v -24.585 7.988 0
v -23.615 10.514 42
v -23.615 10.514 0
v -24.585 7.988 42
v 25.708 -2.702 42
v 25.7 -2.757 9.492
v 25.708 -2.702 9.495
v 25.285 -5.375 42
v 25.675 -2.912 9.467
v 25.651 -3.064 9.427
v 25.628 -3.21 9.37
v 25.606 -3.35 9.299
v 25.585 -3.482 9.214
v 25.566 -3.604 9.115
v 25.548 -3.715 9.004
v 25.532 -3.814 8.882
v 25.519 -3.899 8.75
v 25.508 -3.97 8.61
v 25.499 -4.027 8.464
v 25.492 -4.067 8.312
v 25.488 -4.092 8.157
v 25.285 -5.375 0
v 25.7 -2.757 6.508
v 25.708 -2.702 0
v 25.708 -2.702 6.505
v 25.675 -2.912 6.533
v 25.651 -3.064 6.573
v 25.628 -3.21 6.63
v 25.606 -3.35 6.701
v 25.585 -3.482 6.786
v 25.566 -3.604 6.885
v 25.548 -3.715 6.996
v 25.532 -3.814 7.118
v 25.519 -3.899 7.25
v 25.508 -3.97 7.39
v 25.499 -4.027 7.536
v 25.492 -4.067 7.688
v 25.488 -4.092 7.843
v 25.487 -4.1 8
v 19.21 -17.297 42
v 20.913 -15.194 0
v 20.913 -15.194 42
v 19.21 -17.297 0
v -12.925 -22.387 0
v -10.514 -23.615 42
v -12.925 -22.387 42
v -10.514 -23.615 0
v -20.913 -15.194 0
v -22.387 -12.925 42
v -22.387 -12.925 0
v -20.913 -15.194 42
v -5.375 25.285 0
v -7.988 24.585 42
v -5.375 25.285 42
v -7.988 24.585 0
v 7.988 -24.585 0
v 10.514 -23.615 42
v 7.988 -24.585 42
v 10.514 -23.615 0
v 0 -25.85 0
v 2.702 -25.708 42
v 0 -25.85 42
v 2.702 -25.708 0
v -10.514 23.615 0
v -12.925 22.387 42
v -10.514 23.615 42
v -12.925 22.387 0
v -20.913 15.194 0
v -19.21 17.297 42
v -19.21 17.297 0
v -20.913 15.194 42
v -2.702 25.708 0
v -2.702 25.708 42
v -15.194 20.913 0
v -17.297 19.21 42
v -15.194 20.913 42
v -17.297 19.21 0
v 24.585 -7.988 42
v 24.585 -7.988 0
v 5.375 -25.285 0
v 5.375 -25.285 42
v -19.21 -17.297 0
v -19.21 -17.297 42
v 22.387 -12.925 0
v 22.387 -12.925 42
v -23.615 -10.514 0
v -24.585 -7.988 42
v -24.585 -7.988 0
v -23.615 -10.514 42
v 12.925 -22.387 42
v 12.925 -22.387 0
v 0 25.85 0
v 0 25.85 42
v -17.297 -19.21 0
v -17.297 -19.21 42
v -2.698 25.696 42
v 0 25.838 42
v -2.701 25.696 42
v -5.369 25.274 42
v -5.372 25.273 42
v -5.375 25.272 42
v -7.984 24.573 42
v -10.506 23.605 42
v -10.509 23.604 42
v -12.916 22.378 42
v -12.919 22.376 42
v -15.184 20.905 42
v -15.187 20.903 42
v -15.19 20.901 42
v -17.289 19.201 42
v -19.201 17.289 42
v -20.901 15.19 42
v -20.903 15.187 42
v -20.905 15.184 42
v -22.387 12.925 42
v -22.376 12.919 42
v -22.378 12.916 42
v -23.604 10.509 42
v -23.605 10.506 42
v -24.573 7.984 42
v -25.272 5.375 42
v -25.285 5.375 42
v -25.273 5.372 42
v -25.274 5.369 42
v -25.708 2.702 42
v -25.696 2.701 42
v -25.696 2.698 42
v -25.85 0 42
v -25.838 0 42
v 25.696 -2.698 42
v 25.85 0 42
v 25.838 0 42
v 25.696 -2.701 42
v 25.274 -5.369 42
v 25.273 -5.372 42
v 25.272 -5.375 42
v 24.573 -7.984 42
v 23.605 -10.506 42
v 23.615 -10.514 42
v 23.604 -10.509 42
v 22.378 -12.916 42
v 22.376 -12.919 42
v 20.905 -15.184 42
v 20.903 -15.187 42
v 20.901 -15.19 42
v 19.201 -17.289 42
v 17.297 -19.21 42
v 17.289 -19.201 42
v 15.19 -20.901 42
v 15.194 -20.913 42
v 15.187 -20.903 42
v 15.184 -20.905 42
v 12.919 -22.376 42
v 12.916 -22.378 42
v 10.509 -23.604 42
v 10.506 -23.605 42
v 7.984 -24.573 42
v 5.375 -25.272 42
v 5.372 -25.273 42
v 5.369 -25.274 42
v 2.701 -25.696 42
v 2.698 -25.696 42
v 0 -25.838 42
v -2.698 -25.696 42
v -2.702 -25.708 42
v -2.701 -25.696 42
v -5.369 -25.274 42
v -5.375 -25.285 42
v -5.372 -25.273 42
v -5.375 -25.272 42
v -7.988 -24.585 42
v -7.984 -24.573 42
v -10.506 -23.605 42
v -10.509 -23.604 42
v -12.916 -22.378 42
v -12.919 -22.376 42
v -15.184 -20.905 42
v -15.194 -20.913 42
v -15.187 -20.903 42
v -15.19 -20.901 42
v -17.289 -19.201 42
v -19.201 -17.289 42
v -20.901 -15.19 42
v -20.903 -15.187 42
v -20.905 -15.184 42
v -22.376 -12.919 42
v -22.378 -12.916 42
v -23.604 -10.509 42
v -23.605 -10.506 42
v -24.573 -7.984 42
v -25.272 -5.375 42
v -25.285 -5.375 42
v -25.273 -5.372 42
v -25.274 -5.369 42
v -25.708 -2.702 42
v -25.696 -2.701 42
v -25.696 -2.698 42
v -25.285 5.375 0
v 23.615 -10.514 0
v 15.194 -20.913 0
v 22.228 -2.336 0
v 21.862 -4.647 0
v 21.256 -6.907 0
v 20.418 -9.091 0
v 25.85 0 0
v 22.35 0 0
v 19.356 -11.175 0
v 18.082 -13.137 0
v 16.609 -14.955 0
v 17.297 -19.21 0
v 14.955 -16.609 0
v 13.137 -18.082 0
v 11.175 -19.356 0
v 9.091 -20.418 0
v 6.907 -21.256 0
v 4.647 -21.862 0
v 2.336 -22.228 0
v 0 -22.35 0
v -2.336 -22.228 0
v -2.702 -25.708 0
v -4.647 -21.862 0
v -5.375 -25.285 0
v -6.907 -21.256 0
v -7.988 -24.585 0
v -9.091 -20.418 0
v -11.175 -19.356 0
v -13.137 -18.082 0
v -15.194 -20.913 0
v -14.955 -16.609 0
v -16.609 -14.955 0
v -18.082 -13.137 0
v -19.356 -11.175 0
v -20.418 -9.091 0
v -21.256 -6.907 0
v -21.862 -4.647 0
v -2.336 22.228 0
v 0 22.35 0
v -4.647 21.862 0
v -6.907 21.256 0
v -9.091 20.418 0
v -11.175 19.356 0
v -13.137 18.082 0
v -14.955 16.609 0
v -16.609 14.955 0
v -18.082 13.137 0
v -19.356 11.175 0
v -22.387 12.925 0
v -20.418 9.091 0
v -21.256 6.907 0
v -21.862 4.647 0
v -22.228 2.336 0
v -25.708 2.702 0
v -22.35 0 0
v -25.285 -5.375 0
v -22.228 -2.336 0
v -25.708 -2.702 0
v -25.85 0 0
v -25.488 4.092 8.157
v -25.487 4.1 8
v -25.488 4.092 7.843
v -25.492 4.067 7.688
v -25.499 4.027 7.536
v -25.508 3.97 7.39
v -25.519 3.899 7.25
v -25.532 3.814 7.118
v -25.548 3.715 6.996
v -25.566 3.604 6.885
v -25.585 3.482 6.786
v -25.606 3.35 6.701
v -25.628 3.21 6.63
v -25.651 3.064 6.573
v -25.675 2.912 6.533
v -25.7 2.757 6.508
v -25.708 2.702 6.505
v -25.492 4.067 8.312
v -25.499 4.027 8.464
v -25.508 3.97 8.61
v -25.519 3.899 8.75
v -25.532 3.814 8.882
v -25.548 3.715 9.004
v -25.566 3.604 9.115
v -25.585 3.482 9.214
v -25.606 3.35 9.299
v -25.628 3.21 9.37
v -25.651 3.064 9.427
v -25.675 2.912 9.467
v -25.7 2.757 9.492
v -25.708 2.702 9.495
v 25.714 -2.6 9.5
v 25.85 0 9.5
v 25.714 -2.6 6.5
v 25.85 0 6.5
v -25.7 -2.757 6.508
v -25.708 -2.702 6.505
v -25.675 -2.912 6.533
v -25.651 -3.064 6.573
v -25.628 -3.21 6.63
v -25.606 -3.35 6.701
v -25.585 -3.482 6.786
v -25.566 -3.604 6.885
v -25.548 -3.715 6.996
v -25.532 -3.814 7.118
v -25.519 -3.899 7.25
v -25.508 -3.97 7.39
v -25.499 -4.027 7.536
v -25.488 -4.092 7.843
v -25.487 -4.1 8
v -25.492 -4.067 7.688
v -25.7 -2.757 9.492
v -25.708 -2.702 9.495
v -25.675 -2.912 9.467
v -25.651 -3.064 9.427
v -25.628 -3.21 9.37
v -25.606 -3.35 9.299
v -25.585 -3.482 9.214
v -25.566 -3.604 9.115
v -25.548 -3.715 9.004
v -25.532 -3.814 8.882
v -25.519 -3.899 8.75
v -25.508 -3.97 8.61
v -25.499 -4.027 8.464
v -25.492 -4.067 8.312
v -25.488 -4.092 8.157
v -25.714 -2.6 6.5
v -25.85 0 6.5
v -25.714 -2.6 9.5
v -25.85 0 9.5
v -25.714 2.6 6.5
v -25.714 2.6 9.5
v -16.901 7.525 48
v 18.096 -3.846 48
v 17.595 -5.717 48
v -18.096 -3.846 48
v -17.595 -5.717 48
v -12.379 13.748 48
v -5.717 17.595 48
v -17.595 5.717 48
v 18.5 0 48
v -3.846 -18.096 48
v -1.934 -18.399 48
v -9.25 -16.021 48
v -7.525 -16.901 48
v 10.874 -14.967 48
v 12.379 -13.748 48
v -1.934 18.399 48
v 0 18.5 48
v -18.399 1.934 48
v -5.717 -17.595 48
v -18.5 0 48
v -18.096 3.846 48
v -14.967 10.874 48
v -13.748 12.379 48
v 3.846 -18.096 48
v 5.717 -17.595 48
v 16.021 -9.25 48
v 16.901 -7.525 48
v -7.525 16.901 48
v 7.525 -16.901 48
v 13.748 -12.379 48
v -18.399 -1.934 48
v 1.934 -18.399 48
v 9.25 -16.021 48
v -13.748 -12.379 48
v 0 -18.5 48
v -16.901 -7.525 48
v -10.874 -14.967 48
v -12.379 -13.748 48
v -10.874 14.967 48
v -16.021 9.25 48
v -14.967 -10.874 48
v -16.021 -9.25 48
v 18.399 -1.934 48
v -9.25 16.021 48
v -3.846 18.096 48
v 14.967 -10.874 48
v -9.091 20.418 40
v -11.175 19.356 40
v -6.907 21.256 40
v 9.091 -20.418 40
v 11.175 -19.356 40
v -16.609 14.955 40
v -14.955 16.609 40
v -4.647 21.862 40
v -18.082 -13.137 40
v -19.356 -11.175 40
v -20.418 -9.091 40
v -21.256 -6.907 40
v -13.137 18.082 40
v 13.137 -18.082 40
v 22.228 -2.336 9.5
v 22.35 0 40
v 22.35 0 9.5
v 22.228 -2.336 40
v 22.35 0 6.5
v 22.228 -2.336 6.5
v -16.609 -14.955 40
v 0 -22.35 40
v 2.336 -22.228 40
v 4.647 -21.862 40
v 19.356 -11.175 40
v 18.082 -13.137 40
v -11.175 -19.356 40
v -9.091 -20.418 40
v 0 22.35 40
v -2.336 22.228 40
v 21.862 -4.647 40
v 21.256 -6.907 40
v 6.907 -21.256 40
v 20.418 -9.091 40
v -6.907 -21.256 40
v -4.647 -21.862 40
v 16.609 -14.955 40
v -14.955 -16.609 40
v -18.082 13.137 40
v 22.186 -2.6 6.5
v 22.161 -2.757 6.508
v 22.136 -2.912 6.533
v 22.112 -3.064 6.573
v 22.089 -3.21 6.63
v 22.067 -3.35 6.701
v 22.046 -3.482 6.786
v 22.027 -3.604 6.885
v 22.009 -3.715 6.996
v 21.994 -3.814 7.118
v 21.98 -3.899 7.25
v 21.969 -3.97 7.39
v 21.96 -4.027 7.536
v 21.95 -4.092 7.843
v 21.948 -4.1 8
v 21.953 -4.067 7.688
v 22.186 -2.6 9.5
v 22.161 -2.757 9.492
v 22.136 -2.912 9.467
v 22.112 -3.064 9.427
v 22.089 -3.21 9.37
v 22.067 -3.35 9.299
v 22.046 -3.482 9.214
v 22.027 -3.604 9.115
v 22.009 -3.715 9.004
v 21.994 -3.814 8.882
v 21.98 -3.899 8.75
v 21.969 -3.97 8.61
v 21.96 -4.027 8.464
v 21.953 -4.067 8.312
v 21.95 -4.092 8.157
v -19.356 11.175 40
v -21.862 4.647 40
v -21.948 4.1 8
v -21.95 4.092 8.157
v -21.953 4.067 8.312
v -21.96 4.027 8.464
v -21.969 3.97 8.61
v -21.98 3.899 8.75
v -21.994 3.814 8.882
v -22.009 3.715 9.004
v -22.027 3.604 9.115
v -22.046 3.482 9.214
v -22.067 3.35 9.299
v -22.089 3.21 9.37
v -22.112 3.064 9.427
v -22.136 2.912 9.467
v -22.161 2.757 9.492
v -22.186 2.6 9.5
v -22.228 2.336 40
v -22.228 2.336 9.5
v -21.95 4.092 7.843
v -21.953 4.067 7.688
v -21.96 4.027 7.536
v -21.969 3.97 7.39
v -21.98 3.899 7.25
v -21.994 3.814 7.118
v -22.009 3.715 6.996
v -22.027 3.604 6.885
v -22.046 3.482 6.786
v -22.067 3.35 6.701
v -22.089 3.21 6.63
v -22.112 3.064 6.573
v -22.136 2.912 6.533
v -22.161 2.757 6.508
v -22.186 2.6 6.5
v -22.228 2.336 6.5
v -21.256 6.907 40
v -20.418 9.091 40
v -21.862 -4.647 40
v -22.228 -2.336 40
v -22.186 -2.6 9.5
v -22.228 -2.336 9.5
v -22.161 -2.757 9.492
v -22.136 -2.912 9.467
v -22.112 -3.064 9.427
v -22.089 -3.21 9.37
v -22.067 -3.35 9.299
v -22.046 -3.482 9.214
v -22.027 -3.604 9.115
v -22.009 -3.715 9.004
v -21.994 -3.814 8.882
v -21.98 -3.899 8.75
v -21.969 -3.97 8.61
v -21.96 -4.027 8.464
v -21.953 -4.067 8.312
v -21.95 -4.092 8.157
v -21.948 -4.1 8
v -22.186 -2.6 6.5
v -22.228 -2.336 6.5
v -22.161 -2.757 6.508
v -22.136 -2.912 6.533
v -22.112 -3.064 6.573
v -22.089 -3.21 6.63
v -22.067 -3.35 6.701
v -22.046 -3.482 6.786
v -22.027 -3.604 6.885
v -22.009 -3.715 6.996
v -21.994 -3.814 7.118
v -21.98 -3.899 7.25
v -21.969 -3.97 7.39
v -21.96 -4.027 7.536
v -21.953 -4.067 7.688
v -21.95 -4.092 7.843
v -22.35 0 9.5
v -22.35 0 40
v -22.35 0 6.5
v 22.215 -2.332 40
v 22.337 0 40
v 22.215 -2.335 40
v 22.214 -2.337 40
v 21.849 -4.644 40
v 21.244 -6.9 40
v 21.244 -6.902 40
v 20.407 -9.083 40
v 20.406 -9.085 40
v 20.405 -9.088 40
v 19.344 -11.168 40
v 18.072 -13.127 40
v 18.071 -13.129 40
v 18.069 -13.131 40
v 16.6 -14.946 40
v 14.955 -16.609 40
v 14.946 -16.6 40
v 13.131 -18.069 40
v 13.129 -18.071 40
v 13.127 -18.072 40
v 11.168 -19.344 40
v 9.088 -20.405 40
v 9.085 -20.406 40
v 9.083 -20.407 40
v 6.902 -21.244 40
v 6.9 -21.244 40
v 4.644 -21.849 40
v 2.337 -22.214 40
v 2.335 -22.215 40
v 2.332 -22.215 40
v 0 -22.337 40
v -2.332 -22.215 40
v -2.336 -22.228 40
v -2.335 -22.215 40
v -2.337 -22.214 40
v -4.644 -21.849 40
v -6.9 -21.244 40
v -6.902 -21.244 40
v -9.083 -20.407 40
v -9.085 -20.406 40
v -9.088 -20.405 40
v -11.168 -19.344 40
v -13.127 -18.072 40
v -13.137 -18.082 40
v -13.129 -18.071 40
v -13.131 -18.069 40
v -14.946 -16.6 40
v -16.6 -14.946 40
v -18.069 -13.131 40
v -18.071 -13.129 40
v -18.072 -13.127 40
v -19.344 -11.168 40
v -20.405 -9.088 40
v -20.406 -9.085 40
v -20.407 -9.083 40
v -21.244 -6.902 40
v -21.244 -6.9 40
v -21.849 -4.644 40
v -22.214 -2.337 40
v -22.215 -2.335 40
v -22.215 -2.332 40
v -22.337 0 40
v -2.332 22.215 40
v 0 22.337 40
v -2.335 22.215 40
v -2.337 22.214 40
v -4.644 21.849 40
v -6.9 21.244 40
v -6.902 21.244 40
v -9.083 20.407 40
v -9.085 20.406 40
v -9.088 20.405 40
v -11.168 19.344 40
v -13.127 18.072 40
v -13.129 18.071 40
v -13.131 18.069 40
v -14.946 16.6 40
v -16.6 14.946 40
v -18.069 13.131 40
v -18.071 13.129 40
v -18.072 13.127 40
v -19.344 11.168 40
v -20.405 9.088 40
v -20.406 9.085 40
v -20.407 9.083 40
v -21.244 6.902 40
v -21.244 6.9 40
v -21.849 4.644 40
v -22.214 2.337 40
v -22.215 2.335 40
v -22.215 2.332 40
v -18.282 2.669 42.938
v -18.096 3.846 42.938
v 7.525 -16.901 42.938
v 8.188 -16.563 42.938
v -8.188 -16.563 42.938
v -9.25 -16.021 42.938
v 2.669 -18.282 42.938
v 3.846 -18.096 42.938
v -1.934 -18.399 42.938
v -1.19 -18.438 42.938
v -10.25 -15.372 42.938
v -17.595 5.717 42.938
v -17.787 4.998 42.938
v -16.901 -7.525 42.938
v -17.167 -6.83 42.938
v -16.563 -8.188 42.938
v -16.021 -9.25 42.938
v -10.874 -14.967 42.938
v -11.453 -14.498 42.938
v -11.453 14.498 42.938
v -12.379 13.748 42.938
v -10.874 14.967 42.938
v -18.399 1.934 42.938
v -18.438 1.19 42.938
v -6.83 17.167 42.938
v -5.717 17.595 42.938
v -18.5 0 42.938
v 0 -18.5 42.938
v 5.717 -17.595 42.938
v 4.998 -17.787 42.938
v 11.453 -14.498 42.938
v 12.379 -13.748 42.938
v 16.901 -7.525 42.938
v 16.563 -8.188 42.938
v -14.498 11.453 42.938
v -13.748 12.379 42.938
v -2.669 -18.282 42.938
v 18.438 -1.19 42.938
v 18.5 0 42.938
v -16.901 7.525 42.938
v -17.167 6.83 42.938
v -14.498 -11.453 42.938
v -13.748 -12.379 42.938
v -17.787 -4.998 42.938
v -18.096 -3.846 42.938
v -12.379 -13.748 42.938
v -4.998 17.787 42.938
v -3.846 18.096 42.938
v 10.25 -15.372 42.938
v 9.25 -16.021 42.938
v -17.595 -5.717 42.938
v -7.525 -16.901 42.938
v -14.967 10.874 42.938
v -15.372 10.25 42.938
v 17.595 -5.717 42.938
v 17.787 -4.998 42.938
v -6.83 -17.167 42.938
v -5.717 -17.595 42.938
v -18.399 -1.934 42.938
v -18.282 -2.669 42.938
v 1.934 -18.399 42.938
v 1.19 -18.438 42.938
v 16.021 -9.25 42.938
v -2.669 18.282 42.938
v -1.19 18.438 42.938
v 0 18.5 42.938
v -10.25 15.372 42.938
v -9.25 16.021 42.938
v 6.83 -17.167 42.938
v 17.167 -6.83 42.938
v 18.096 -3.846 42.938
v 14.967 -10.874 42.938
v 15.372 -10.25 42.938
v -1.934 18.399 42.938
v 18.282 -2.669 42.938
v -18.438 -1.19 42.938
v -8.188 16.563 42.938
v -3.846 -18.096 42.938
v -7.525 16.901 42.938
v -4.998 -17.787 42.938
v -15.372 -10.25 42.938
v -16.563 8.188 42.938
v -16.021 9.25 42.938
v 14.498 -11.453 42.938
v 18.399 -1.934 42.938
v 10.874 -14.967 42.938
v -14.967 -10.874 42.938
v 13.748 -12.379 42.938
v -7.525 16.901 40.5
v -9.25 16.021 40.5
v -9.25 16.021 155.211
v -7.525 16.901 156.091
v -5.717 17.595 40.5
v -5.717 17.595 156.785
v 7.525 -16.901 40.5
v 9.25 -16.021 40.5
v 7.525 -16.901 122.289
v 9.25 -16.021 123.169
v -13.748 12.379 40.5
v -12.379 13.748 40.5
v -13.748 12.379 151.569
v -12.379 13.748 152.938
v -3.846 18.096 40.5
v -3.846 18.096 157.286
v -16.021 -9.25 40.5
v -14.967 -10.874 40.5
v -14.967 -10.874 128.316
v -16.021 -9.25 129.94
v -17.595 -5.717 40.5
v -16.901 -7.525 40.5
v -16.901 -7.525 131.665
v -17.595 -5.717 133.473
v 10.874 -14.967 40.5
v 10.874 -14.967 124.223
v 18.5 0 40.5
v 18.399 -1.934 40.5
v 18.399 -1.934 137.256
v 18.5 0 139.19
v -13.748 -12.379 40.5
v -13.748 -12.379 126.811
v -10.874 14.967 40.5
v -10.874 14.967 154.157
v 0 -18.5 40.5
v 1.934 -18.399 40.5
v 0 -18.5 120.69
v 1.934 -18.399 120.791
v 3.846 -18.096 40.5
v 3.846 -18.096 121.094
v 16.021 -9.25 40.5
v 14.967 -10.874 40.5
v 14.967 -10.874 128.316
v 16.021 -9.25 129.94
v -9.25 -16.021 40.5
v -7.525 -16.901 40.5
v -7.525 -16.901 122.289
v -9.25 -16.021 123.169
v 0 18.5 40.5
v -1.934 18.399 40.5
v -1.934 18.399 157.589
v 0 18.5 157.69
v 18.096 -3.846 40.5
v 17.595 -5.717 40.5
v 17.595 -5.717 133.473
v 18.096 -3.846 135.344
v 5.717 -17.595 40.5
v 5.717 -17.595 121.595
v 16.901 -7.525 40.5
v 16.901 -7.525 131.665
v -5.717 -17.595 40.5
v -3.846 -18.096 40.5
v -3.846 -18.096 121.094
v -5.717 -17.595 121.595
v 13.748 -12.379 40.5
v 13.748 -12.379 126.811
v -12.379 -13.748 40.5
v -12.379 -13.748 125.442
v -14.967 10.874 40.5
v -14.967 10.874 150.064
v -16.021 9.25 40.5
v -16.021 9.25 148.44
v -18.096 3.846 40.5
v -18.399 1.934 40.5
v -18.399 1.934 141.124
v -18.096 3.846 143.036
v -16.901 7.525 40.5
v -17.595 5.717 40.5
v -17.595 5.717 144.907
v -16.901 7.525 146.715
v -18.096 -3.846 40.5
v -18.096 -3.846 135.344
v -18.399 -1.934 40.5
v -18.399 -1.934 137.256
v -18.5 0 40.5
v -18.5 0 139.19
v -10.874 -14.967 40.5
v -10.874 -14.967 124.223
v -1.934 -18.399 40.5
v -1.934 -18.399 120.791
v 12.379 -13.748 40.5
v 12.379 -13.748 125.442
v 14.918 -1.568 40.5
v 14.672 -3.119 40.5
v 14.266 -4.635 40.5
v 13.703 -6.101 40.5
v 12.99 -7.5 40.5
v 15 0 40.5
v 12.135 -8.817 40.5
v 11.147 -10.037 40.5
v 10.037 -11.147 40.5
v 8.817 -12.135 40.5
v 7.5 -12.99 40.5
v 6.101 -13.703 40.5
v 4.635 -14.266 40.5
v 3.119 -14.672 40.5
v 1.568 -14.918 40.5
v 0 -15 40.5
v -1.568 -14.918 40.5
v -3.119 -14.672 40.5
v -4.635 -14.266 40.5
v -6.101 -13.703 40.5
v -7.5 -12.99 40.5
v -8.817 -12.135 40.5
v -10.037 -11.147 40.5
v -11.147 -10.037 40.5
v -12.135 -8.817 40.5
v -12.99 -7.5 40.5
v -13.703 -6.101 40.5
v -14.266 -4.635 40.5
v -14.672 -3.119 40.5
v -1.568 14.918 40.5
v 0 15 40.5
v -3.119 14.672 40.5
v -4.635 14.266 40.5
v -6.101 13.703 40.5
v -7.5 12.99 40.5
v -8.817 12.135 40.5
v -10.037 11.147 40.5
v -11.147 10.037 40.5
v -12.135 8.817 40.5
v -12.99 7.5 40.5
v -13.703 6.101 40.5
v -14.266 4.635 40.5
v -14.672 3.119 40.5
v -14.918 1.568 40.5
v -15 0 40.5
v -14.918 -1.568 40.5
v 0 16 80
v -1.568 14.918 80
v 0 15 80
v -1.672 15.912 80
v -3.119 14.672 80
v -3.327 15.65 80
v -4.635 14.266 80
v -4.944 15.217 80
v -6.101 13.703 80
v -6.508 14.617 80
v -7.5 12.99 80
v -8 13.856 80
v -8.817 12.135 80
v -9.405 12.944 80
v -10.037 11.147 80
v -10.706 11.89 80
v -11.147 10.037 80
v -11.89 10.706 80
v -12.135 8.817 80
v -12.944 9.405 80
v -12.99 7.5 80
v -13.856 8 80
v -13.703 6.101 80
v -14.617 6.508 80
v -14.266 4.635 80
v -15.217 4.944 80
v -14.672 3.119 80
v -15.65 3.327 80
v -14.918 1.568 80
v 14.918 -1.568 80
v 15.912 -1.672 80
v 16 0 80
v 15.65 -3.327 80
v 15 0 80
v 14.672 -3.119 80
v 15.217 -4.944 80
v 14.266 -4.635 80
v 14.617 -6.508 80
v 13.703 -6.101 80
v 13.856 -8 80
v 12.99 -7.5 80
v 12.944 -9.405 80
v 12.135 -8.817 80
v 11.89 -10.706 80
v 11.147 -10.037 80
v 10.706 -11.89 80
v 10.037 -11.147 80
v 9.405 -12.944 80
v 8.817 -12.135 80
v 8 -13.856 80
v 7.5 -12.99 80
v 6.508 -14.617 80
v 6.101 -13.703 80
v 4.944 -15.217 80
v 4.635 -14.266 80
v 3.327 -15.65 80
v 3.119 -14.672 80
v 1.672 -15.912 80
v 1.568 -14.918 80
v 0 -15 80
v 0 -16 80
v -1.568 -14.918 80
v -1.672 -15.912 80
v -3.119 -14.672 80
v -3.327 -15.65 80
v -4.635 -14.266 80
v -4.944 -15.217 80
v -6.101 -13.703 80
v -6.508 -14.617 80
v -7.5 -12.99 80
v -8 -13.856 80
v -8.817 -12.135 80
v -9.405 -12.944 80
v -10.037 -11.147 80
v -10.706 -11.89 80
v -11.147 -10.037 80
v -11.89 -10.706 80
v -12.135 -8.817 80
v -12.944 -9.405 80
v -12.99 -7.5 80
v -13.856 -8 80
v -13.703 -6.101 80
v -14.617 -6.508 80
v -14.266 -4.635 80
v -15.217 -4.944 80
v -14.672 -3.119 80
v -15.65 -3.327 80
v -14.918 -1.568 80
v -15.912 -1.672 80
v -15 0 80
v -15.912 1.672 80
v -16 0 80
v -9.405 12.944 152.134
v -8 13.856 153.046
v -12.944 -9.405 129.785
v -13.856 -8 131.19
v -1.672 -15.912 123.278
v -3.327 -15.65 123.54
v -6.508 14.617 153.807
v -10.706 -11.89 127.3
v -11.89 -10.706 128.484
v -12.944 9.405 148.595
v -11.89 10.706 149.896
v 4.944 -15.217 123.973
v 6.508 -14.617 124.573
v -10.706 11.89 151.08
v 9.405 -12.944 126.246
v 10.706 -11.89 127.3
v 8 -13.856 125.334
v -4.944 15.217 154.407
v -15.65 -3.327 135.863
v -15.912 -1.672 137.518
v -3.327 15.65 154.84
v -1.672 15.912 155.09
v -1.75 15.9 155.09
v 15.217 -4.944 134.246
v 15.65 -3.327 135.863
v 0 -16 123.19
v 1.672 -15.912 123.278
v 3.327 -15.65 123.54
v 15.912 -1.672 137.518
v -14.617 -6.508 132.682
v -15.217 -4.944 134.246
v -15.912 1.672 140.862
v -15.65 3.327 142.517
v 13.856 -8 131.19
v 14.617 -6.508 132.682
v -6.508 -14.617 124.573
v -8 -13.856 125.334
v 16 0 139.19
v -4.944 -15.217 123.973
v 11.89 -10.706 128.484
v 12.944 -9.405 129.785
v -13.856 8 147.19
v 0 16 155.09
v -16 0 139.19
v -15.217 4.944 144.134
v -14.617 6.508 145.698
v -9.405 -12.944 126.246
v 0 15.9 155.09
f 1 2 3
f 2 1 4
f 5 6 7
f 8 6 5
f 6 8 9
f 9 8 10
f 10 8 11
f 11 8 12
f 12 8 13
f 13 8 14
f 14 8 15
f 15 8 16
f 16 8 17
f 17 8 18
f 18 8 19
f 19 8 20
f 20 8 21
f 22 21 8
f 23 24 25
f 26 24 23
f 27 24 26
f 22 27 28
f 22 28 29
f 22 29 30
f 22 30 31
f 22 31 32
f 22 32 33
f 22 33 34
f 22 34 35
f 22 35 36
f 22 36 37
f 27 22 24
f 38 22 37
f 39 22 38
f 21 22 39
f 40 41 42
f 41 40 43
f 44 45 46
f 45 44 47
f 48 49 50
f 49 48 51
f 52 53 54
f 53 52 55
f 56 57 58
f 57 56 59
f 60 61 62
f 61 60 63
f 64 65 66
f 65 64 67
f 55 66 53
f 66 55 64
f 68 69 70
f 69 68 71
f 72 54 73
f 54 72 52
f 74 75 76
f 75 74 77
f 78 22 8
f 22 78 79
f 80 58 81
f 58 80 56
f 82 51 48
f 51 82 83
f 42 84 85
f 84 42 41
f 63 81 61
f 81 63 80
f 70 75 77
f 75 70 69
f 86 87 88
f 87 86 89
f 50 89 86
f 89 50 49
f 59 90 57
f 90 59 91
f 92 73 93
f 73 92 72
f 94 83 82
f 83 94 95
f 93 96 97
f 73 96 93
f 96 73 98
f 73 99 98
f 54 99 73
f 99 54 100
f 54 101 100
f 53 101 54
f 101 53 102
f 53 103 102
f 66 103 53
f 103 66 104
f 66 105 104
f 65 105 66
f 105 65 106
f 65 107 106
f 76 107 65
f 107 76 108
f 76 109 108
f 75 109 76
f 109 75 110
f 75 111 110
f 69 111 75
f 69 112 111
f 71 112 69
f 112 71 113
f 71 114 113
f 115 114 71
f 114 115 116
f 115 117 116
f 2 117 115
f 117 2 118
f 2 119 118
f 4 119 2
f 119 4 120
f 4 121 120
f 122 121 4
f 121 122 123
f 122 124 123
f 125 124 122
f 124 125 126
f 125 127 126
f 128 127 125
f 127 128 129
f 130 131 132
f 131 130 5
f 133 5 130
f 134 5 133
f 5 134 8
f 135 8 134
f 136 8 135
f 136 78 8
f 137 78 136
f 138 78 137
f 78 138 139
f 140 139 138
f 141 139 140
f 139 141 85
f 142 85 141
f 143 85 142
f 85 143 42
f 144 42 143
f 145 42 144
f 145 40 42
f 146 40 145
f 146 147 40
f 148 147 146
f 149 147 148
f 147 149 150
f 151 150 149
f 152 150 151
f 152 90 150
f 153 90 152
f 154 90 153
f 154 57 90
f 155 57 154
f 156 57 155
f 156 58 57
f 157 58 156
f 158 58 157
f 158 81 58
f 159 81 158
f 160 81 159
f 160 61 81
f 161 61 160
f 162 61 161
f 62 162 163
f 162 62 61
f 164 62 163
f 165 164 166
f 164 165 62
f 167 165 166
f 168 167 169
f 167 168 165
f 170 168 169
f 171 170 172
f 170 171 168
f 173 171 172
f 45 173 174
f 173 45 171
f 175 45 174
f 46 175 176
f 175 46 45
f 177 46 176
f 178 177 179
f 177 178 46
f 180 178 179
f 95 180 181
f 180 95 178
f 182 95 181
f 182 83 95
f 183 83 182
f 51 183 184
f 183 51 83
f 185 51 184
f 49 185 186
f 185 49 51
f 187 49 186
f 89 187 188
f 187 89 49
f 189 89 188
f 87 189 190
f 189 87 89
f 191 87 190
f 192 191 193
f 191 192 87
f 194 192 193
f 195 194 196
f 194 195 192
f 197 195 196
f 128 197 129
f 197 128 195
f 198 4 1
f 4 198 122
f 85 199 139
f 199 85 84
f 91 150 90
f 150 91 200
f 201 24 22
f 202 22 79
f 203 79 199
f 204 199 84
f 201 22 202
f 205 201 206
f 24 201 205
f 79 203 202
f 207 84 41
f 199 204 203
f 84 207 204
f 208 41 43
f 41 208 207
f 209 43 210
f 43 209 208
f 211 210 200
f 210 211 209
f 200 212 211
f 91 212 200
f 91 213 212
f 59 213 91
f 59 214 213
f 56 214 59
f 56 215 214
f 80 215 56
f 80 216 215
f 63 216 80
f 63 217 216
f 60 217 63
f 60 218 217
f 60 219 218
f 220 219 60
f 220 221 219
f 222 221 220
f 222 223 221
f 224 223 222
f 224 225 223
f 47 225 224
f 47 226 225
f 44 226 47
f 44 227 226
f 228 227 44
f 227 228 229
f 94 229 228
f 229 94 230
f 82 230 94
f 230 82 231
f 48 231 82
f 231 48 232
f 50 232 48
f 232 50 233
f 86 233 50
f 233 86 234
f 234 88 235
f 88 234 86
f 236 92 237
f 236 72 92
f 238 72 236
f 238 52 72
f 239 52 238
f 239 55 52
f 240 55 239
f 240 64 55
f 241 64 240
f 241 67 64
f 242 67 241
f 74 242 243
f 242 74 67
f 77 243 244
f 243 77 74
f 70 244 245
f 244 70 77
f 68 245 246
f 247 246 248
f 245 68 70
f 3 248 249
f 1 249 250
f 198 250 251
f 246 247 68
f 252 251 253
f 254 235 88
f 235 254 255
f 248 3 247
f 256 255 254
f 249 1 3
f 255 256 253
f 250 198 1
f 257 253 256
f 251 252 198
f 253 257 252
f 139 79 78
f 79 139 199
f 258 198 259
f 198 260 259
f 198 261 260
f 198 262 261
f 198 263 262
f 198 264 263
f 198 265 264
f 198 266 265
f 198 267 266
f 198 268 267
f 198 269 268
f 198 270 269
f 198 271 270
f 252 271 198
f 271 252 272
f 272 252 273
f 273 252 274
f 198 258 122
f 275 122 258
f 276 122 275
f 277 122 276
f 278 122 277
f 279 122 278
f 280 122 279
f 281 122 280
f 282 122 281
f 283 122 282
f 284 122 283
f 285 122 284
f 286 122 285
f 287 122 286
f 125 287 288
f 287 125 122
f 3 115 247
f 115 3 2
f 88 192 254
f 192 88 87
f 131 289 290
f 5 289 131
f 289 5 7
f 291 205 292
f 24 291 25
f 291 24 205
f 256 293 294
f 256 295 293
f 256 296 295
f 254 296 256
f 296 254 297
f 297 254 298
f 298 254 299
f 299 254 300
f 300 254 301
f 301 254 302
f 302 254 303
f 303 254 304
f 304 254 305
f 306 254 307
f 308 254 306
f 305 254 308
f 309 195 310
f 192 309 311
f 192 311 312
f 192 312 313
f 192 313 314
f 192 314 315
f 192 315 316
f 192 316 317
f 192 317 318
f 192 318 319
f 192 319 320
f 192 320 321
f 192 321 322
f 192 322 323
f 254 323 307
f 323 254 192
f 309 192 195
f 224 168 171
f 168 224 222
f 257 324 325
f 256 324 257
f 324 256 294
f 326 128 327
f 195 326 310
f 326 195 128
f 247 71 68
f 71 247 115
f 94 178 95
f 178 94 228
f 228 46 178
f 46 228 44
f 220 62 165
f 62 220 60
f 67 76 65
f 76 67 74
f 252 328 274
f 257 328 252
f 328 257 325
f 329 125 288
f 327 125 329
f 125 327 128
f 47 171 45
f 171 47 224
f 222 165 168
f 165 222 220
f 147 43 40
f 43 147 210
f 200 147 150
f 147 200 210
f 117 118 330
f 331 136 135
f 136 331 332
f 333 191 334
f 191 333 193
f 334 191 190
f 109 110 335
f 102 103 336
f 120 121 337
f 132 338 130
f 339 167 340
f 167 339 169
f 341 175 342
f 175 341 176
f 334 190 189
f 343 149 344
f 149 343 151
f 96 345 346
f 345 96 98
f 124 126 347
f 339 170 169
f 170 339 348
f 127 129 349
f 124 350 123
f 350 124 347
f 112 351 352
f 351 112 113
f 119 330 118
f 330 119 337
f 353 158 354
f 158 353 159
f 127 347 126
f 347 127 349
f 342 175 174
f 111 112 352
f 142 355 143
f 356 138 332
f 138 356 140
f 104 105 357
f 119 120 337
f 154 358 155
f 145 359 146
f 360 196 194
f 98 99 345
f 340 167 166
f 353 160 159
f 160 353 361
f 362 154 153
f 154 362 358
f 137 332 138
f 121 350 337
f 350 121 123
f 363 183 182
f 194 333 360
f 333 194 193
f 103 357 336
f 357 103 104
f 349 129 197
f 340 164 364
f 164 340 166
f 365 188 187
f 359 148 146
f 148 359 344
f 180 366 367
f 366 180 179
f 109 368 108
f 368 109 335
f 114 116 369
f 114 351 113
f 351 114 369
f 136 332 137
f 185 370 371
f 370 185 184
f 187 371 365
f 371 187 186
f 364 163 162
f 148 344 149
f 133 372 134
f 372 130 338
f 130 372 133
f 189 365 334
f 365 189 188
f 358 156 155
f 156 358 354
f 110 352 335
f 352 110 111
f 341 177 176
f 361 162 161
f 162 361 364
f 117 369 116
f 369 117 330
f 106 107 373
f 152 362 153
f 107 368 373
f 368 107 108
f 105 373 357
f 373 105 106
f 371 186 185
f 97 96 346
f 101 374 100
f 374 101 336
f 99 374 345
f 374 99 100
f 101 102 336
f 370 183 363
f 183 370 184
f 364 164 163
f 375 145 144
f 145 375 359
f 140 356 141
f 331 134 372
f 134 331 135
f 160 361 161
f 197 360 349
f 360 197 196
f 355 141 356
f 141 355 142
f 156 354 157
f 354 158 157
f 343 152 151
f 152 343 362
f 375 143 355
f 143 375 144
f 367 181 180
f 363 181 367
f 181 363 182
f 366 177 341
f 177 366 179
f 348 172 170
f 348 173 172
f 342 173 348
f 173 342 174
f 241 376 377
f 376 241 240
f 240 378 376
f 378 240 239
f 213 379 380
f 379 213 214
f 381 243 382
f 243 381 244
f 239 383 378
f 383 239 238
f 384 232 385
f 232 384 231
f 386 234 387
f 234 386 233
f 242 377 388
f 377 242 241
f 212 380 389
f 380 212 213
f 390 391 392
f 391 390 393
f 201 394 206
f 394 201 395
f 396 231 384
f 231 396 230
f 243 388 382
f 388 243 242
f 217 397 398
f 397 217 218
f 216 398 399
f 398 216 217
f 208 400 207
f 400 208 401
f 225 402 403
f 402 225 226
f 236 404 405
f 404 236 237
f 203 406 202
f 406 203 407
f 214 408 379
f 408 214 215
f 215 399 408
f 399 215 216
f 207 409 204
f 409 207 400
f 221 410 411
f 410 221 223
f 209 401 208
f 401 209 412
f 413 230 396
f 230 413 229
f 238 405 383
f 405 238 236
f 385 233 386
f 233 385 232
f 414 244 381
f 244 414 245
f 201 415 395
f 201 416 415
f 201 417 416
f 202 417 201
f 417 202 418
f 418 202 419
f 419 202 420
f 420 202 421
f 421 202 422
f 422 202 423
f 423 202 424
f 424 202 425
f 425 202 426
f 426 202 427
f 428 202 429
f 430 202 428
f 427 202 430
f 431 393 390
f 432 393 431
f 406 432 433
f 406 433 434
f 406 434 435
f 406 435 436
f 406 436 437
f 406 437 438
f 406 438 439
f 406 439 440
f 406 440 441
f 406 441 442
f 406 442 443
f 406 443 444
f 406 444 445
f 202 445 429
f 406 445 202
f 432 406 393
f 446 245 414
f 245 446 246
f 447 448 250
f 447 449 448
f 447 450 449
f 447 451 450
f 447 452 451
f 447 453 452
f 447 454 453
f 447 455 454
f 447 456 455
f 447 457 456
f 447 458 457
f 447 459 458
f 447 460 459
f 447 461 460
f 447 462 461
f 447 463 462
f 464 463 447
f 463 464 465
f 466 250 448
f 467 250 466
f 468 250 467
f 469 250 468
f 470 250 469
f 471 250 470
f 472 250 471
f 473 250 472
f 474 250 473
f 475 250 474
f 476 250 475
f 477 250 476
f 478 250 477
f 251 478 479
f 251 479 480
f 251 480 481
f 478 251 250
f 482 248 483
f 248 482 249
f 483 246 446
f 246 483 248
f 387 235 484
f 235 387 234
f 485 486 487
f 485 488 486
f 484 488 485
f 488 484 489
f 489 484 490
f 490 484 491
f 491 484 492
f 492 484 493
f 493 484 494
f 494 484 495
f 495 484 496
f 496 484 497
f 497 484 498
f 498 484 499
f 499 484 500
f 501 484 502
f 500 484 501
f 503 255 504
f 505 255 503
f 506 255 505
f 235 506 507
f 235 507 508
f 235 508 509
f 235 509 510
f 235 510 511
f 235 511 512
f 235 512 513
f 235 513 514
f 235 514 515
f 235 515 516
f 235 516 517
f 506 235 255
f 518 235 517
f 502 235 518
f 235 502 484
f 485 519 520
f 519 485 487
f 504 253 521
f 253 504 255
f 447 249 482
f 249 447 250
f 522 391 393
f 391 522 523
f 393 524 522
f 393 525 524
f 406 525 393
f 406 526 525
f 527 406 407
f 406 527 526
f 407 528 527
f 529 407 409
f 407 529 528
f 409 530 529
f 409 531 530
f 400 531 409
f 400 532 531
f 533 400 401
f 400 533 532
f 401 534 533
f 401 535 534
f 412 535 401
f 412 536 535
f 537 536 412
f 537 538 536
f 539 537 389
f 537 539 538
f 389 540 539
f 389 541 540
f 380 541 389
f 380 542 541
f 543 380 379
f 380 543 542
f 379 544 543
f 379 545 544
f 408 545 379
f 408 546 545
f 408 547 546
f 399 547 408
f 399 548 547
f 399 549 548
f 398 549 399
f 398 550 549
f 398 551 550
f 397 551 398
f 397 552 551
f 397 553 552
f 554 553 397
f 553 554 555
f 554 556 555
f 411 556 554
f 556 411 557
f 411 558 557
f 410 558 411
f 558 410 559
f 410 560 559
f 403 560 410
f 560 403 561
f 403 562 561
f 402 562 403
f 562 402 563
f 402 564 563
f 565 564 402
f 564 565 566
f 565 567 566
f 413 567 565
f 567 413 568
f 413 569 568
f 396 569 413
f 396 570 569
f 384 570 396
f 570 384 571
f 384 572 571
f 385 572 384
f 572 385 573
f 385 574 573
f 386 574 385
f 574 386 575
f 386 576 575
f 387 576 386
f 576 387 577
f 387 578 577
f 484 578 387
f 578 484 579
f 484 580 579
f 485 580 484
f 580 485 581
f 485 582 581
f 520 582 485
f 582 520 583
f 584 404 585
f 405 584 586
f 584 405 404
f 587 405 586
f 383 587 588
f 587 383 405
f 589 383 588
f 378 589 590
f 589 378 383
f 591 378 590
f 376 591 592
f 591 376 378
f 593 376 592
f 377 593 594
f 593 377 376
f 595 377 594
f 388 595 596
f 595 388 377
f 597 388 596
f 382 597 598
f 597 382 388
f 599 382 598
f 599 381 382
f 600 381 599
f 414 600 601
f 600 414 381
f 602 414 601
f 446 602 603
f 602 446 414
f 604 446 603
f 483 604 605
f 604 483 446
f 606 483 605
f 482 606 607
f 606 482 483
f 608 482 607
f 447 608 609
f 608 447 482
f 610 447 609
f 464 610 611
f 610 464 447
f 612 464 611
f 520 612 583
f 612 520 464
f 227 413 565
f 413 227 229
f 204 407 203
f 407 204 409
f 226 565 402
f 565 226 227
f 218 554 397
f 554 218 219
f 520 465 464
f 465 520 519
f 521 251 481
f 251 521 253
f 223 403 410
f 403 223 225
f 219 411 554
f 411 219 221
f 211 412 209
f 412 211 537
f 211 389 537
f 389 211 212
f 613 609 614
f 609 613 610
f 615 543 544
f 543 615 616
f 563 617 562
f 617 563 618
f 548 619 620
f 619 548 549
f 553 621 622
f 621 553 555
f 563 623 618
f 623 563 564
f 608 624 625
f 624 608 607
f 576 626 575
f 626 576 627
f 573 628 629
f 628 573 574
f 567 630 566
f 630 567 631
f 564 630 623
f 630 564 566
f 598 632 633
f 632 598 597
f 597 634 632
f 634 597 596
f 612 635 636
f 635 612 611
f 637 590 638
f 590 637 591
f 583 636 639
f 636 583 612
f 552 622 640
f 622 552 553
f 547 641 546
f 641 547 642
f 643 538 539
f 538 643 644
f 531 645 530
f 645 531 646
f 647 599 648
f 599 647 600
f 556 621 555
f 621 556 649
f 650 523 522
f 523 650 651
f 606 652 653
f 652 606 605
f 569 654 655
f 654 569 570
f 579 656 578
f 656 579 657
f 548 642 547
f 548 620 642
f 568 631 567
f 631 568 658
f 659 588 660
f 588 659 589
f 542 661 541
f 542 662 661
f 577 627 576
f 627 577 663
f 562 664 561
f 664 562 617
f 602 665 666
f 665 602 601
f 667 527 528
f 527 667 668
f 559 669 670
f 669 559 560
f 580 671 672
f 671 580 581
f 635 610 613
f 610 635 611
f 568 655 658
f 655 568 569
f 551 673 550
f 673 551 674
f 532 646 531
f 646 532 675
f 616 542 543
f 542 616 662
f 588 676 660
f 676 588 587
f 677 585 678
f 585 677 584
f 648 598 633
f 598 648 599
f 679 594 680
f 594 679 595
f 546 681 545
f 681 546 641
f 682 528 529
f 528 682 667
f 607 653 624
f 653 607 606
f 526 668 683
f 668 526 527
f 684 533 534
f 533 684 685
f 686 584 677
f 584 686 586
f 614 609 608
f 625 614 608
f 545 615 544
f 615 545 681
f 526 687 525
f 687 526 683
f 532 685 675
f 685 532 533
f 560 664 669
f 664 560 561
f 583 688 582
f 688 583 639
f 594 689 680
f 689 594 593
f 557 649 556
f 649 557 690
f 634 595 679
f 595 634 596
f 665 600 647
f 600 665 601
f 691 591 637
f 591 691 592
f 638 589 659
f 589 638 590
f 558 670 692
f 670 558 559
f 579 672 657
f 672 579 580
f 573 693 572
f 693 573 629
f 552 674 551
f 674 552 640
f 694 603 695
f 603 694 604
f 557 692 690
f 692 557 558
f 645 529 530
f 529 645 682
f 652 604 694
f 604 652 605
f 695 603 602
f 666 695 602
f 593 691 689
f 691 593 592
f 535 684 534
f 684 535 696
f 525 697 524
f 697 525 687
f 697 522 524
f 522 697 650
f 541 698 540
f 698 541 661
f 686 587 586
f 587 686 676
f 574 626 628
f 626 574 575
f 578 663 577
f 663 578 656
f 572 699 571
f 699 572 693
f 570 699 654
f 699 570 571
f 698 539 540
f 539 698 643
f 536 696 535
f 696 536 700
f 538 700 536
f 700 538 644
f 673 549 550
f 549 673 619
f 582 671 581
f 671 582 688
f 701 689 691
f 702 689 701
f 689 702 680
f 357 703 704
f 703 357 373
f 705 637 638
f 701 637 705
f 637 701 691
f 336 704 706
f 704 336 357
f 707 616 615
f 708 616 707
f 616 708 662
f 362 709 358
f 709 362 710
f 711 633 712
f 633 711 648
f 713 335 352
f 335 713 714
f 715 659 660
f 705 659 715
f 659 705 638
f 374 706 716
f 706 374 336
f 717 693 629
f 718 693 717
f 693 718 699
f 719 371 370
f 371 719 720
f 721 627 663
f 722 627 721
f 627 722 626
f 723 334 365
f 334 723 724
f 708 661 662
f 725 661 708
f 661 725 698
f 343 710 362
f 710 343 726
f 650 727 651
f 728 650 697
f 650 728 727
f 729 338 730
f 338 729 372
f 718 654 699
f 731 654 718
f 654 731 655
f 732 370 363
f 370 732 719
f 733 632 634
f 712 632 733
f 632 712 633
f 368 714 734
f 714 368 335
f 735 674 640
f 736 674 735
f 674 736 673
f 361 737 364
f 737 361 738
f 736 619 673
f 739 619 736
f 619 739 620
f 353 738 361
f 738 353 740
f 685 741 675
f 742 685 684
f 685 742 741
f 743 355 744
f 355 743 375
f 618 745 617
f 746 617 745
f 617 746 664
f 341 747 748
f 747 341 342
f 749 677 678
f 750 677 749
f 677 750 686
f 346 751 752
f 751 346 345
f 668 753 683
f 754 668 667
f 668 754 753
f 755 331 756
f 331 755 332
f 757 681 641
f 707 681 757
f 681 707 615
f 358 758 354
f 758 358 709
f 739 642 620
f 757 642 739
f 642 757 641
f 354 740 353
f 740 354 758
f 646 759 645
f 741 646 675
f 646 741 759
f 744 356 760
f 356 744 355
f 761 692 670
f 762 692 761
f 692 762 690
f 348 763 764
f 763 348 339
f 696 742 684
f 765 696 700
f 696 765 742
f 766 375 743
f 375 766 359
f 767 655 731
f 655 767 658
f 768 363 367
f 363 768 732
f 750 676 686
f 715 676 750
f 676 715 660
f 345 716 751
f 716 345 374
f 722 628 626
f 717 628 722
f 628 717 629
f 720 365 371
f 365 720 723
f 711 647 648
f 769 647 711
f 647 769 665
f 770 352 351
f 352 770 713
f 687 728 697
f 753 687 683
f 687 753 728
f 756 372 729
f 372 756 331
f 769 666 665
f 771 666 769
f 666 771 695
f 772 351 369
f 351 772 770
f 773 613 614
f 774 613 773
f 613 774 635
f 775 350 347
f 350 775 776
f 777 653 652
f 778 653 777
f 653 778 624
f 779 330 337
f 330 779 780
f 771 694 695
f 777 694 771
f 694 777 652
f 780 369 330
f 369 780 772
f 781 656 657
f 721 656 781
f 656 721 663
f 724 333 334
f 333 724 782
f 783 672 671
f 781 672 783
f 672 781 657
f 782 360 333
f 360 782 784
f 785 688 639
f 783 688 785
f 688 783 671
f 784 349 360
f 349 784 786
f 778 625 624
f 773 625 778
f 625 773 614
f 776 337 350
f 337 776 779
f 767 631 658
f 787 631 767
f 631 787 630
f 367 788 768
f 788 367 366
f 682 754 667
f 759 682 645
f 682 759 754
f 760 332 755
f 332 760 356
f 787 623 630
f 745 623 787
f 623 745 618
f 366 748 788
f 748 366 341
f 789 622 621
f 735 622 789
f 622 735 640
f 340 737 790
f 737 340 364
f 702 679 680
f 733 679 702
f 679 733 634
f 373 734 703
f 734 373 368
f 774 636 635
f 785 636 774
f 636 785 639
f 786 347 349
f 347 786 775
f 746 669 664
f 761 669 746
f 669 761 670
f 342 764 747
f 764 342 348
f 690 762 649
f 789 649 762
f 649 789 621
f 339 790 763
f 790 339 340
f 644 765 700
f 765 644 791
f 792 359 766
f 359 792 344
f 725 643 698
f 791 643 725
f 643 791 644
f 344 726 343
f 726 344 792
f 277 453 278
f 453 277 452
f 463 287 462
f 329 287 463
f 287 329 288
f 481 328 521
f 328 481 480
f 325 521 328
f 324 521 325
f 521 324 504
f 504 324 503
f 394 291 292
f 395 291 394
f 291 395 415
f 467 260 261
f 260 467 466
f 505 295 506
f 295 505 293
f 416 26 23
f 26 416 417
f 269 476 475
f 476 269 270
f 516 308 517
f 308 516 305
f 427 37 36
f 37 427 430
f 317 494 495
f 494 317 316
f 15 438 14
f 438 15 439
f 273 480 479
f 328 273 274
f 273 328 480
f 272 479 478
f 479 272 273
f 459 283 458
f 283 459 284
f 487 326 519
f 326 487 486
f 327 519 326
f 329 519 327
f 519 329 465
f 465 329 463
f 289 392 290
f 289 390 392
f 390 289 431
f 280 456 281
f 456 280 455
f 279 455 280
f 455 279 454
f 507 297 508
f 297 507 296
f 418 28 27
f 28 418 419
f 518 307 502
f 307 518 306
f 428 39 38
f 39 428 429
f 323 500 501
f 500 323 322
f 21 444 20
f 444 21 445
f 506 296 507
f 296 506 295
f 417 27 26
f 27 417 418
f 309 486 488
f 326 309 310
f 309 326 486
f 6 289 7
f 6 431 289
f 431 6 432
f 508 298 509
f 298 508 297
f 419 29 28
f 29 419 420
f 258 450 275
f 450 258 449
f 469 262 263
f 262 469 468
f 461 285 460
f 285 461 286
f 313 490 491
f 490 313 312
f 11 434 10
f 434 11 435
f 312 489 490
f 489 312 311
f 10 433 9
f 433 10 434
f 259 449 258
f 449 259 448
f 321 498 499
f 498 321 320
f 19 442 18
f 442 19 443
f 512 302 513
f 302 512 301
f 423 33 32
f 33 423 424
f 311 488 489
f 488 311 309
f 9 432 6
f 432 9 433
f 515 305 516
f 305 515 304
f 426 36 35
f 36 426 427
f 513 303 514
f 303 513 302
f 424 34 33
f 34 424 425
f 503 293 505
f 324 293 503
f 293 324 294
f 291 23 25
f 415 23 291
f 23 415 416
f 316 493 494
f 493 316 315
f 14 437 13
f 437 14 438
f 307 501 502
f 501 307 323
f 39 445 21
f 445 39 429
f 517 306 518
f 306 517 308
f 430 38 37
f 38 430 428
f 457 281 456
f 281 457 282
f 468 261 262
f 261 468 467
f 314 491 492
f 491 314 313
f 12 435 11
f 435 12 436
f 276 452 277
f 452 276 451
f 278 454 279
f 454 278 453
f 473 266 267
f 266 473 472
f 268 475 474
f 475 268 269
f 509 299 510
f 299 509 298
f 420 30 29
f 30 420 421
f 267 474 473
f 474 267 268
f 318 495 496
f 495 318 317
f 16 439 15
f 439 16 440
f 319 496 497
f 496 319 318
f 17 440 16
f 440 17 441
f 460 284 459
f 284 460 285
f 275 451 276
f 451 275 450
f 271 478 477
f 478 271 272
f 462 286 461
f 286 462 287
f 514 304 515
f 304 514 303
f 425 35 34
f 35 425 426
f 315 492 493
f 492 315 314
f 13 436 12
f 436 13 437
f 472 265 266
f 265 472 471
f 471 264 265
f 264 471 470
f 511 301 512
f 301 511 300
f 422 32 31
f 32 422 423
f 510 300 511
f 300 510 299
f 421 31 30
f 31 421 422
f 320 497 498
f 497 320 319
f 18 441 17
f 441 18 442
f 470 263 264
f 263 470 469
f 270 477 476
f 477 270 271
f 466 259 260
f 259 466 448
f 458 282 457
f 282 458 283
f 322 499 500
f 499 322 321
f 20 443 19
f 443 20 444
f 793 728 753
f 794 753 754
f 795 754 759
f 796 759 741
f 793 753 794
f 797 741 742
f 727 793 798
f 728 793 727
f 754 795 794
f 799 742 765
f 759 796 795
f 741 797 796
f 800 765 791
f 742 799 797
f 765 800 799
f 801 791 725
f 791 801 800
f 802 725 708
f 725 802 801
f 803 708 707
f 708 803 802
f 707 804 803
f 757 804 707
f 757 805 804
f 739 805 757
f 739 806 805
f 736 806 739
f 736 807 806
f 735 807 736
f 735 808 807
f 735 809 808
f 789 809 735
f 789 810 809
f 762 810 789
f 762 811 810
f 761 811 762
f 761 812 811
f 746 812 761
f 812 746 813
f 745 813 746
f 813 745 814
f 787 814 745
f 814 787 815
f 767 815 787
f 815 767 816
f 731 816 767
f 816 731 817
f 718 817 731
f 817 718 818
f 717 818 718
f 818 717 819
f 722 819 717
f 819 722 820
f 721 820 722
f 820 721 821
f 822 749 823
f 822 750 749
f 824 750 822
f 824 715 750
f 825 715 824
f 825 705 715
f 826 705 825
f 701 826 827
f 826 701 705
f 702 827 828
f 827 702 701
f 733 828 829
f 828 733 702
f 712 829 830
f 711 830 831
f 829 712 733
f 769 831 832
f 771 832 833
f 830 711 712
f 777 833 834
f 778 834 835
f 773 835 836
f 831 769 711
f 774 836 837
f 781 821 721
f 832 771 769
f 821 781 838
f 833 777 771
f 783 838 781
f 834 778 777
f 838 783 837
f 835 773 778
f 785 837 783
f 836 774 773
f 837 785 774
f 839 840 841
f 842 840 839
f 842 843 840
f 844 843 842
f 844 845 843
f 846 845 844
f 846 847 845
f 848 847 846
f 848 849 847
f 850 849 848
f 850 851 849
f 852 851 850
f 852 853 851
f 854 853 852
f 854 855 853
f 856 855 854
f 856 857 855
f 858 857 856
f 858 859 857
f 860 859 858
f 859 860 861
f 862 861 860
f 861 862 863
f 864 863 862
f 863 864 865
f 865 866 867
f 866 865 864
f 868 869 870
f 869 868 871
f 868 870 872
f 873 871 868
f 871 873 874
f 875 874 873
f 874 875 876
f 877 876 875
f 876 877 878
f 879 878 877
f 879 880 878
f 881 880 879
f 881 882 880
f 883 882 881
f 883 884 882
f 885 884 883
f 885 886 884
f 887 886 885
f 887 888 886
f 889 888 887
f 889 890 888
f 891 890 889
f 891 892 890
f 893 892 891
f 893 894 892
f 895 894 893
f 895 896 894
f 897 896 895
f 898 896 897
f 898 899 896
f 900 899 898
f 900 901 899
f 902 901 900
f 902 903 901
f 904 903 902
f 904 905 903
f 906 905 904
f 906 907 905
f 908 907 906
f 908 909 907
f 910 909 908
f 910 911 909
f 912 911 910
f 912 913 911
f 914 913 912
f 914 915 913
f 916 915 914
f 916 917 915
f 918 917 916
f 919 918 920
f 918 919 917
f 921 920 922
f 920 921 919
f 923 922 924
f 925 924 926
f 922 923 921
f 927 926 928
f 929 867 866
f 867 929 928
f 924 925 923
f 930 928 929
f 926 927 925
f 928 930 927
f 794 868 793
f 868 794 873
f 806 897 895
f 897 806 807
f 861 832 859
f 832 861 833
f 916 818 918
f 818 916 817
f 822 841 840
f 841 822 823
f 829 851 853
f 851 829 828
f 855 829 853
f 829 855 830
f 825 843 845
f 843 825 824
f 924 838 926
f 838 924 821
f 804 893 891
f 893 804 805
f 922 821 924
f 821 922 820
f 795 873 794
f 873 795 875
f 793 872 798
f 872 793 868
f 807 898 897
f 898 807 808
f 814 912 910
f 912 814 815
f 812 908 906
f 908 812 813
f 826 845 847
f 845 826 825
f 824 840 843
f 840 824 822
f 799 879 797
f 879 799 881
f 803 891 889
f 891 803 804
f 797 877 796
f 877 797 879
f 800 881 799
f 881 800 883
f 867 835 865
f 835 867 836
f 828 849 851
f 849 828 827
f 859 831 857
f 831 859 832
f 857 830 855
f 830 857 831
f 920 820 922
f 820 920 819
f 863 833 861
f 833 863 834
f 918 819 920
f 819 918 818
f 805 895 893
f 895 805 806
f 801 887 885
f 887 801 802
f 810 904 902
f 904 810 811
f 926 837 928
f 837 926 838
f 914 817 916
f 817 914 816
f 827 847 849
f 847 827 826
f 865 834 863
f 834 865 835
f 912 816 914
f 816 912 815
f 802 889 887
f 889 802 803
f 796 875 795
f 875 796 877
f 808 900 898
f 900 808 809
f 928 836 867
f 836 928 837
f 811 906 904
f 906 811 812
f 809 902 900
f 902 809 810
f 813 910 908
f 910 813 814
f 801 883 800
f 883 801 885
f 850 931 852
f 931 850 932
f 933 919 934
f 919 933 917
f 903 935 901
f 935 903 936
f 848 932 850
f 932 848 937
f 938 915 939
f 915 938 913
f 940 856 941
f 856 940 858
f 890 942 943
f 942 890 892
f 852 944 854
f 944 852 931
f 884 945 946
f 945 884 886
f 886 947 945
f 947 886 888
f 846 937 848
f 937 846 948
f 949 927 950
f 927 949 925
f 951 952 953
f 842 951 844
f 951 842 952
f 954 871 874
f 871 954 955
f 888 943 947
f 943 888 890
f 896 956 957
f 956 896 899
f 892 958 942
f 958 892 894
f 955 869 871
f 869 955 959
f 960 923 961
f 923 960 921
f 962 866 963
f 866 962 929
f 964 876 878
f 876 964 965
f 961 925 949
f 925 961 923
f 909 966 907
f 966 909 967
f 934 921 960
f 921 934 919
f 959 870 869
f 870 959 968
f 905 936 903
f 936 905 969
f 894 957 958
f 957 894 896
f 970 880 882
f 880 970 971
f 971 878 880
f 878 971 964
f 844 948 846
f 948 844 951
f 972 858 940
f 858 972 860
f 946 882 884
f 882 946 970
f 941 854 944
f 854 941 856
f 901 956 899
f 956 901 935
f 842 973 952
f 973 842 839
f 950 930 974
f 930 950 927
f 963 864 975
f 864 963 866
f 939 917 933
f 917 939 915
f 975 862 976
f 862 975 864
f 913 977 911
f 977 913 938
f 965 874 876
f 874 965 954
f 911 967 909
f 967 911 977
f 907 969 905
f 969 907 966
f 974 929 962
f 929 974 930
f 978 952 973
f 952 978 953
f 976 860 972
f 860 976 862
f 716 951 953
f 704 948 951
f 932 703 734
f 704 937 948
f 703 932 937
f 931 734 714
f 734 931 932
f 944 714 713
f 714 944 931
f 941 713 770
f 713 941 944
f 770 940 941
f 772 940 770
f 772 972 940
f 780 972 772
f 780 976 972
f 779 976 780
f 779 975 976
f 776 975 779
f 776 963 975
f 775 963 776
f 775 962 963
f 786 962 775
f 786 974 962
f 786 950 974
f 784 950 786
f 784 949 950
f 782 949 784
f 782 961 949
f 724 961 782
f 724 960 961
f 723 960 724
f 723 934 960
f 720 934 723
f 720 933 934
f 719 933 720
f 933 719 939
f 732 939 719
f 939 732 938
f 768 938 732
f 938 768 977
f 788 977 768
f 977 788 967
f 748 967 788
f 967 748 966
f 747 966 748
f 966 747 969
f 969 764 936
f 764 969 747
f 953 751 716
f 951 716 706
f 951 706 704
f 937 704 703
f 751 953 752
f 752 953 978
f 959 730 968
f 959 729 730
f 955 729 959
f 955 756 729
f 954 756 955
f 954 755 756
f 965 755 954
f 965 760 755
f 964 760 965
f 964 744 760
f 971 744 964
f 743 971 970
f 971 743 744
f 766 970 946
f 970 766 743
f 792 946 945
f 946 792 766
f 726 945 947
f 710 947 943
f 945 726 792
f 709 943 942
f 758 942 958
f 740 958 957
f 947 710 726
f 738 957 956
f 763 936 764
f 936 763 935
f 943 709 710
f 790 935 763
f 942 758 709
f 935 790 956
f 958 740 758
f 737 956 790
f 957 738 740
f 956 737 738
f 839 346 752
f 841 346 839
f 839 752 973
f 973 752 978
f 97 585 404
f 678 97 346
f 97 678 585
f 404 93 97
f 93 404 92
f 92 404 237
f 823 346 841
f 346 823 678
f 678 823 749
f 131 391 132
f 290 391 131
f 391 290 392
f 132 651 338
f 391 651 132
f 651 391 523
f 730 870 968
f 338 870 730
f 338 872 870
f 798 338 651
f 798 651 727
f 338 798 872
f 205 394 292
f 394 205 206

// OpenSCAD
// Numatic HVR200
//
// handvat (zoals vastgemaakt aan de slang) 
//   - buitendiameter van 37mm 
//   - materiaal dikte varieert
//     - mondstuk zelf is ongeveer 2.5mm
//     - bredere stuk bij slang is bijna 4mm
//   - bredere stuk is 51.7mm
//     - overgang is 6mm
//     - lengte is 47 (incl overgang)
//     - uitsparingen voor nokjes
//       - d=3mm
//       - l=8.2
//       - afstand 6.5
// flexibele buis heeft opzetstuk van 43.5mm (dat draait in het handvat)
// metalen buis
//   - buitendiameter 31.6
// borstelmondstuk 
//   - binnnendiameter 31.3mm
// verbindingsstuk verloopt van 30 tot 32.9

// First plan was to print a 
// - Sleeve to reinforce existing mouthpiece
// - Now the design is a complete rebuild of the entire mouth piece


$fn=60;

module tube(
    diameter=37,
    l=73,
    m=2.5
) {
    diameter2=diameter-m*2;
    difference() {
      cylinder(h=l,d=diameter);
      translate([0,0,-0.1])
      cylinder(h=l+0.2,d=diameter2);
    }
}

module slantedtube(
    diameter=37, 
    l=70, 
    m=2.5, 
    sleeve=1,
    debug=0) {
    
    d2=m*2; // verschil buiten en binnendiameter
    
    D = sleeve == 1 ? diameter + 0.2 : diameter - d2;
    D2= sleeve == 1 ? D+d2           : D+d2;
    D3= diameter + d2 + 0.2;
    difference() {
      cylinder(h=l+D3,d=D+d2);
      translate([0,0,-0.1])
        cylinder(h=l+D2+0.2,d=D);
      if (debug) {
        translate([0,-D2/2-0.1,0]) 
          cube([D2,D2+0.2,l+D2]);
      }
      translate([-D3/2-0.1,-D3/2-0.1,l])
        rotate([45,0,0])
        cube([D3+0.2,sqrt(D3*D3*2)+0.2,D3]);
    }
}

module massivebase(
    diameter=51.7,
    diameter2=37,
    l=46.5,
    l2=6
) {
    cylinder(h=l-l2,d=diameter);
    translate([0,0,l-l2-0.01])
    cylinder(h=l2+0.01,d1=diameter,d2=diameter2);
}

module base(
    diameter=51.7,
    diameter2=37,
    m=4,
    m2=2.5,
    l=47,
    l2=6,
    // uitsparingen of nokjes
    nd=3,
    nl=5.2,
    nz=8
    ) {
    
    d2=m*2;
    
    difference() {
      massivebase(l=l);
      translate([0,0,-2])
        massivebase(
          // 51.7 - 4*2 = 43.7
          // print 1 is te klein
          // - na al even te hebben gevijld is hij nog
          // - 43.3 tot 43.7
          diameter=diameter-d2+1,
          diameter2=diameter2-d2,
          l=l);
      cylinder(h=l+0.1,d=diameter2);
      translate([-diameter/2-0.1,0,nz])
        rotate([0,90,0])
        hull() {
          translate([0,-nl/2,0])
            cylinder(h=diameter+0.2,d=nd);
          translate([0,nl/2,0])
            cylinder(h=diameter+0.2,d=nd);
        }
    }
}

//tube();
//translate([0,0,-5])

module mouthpiece() {
    l=48;
    base(l=l);
    translate([0,0,40.5])
      tube(l=80-40.5,m=3.5);
    translate([0,0,l-0.01])
      slantedtube(sleeve=0);
}

difference() {
  mouthpiece();
  cube([50,50,160]); }

// check 1 (mounting piece)
%difference() {
  cylinder(h=40,d=43.5);
  cube([50,50,150]);
}

// check 2 (metal tube)
% difference() {
  translate([0,0,80])
    cylinder(h=70,d=31.6);
  cube([50,50,160]);
}
